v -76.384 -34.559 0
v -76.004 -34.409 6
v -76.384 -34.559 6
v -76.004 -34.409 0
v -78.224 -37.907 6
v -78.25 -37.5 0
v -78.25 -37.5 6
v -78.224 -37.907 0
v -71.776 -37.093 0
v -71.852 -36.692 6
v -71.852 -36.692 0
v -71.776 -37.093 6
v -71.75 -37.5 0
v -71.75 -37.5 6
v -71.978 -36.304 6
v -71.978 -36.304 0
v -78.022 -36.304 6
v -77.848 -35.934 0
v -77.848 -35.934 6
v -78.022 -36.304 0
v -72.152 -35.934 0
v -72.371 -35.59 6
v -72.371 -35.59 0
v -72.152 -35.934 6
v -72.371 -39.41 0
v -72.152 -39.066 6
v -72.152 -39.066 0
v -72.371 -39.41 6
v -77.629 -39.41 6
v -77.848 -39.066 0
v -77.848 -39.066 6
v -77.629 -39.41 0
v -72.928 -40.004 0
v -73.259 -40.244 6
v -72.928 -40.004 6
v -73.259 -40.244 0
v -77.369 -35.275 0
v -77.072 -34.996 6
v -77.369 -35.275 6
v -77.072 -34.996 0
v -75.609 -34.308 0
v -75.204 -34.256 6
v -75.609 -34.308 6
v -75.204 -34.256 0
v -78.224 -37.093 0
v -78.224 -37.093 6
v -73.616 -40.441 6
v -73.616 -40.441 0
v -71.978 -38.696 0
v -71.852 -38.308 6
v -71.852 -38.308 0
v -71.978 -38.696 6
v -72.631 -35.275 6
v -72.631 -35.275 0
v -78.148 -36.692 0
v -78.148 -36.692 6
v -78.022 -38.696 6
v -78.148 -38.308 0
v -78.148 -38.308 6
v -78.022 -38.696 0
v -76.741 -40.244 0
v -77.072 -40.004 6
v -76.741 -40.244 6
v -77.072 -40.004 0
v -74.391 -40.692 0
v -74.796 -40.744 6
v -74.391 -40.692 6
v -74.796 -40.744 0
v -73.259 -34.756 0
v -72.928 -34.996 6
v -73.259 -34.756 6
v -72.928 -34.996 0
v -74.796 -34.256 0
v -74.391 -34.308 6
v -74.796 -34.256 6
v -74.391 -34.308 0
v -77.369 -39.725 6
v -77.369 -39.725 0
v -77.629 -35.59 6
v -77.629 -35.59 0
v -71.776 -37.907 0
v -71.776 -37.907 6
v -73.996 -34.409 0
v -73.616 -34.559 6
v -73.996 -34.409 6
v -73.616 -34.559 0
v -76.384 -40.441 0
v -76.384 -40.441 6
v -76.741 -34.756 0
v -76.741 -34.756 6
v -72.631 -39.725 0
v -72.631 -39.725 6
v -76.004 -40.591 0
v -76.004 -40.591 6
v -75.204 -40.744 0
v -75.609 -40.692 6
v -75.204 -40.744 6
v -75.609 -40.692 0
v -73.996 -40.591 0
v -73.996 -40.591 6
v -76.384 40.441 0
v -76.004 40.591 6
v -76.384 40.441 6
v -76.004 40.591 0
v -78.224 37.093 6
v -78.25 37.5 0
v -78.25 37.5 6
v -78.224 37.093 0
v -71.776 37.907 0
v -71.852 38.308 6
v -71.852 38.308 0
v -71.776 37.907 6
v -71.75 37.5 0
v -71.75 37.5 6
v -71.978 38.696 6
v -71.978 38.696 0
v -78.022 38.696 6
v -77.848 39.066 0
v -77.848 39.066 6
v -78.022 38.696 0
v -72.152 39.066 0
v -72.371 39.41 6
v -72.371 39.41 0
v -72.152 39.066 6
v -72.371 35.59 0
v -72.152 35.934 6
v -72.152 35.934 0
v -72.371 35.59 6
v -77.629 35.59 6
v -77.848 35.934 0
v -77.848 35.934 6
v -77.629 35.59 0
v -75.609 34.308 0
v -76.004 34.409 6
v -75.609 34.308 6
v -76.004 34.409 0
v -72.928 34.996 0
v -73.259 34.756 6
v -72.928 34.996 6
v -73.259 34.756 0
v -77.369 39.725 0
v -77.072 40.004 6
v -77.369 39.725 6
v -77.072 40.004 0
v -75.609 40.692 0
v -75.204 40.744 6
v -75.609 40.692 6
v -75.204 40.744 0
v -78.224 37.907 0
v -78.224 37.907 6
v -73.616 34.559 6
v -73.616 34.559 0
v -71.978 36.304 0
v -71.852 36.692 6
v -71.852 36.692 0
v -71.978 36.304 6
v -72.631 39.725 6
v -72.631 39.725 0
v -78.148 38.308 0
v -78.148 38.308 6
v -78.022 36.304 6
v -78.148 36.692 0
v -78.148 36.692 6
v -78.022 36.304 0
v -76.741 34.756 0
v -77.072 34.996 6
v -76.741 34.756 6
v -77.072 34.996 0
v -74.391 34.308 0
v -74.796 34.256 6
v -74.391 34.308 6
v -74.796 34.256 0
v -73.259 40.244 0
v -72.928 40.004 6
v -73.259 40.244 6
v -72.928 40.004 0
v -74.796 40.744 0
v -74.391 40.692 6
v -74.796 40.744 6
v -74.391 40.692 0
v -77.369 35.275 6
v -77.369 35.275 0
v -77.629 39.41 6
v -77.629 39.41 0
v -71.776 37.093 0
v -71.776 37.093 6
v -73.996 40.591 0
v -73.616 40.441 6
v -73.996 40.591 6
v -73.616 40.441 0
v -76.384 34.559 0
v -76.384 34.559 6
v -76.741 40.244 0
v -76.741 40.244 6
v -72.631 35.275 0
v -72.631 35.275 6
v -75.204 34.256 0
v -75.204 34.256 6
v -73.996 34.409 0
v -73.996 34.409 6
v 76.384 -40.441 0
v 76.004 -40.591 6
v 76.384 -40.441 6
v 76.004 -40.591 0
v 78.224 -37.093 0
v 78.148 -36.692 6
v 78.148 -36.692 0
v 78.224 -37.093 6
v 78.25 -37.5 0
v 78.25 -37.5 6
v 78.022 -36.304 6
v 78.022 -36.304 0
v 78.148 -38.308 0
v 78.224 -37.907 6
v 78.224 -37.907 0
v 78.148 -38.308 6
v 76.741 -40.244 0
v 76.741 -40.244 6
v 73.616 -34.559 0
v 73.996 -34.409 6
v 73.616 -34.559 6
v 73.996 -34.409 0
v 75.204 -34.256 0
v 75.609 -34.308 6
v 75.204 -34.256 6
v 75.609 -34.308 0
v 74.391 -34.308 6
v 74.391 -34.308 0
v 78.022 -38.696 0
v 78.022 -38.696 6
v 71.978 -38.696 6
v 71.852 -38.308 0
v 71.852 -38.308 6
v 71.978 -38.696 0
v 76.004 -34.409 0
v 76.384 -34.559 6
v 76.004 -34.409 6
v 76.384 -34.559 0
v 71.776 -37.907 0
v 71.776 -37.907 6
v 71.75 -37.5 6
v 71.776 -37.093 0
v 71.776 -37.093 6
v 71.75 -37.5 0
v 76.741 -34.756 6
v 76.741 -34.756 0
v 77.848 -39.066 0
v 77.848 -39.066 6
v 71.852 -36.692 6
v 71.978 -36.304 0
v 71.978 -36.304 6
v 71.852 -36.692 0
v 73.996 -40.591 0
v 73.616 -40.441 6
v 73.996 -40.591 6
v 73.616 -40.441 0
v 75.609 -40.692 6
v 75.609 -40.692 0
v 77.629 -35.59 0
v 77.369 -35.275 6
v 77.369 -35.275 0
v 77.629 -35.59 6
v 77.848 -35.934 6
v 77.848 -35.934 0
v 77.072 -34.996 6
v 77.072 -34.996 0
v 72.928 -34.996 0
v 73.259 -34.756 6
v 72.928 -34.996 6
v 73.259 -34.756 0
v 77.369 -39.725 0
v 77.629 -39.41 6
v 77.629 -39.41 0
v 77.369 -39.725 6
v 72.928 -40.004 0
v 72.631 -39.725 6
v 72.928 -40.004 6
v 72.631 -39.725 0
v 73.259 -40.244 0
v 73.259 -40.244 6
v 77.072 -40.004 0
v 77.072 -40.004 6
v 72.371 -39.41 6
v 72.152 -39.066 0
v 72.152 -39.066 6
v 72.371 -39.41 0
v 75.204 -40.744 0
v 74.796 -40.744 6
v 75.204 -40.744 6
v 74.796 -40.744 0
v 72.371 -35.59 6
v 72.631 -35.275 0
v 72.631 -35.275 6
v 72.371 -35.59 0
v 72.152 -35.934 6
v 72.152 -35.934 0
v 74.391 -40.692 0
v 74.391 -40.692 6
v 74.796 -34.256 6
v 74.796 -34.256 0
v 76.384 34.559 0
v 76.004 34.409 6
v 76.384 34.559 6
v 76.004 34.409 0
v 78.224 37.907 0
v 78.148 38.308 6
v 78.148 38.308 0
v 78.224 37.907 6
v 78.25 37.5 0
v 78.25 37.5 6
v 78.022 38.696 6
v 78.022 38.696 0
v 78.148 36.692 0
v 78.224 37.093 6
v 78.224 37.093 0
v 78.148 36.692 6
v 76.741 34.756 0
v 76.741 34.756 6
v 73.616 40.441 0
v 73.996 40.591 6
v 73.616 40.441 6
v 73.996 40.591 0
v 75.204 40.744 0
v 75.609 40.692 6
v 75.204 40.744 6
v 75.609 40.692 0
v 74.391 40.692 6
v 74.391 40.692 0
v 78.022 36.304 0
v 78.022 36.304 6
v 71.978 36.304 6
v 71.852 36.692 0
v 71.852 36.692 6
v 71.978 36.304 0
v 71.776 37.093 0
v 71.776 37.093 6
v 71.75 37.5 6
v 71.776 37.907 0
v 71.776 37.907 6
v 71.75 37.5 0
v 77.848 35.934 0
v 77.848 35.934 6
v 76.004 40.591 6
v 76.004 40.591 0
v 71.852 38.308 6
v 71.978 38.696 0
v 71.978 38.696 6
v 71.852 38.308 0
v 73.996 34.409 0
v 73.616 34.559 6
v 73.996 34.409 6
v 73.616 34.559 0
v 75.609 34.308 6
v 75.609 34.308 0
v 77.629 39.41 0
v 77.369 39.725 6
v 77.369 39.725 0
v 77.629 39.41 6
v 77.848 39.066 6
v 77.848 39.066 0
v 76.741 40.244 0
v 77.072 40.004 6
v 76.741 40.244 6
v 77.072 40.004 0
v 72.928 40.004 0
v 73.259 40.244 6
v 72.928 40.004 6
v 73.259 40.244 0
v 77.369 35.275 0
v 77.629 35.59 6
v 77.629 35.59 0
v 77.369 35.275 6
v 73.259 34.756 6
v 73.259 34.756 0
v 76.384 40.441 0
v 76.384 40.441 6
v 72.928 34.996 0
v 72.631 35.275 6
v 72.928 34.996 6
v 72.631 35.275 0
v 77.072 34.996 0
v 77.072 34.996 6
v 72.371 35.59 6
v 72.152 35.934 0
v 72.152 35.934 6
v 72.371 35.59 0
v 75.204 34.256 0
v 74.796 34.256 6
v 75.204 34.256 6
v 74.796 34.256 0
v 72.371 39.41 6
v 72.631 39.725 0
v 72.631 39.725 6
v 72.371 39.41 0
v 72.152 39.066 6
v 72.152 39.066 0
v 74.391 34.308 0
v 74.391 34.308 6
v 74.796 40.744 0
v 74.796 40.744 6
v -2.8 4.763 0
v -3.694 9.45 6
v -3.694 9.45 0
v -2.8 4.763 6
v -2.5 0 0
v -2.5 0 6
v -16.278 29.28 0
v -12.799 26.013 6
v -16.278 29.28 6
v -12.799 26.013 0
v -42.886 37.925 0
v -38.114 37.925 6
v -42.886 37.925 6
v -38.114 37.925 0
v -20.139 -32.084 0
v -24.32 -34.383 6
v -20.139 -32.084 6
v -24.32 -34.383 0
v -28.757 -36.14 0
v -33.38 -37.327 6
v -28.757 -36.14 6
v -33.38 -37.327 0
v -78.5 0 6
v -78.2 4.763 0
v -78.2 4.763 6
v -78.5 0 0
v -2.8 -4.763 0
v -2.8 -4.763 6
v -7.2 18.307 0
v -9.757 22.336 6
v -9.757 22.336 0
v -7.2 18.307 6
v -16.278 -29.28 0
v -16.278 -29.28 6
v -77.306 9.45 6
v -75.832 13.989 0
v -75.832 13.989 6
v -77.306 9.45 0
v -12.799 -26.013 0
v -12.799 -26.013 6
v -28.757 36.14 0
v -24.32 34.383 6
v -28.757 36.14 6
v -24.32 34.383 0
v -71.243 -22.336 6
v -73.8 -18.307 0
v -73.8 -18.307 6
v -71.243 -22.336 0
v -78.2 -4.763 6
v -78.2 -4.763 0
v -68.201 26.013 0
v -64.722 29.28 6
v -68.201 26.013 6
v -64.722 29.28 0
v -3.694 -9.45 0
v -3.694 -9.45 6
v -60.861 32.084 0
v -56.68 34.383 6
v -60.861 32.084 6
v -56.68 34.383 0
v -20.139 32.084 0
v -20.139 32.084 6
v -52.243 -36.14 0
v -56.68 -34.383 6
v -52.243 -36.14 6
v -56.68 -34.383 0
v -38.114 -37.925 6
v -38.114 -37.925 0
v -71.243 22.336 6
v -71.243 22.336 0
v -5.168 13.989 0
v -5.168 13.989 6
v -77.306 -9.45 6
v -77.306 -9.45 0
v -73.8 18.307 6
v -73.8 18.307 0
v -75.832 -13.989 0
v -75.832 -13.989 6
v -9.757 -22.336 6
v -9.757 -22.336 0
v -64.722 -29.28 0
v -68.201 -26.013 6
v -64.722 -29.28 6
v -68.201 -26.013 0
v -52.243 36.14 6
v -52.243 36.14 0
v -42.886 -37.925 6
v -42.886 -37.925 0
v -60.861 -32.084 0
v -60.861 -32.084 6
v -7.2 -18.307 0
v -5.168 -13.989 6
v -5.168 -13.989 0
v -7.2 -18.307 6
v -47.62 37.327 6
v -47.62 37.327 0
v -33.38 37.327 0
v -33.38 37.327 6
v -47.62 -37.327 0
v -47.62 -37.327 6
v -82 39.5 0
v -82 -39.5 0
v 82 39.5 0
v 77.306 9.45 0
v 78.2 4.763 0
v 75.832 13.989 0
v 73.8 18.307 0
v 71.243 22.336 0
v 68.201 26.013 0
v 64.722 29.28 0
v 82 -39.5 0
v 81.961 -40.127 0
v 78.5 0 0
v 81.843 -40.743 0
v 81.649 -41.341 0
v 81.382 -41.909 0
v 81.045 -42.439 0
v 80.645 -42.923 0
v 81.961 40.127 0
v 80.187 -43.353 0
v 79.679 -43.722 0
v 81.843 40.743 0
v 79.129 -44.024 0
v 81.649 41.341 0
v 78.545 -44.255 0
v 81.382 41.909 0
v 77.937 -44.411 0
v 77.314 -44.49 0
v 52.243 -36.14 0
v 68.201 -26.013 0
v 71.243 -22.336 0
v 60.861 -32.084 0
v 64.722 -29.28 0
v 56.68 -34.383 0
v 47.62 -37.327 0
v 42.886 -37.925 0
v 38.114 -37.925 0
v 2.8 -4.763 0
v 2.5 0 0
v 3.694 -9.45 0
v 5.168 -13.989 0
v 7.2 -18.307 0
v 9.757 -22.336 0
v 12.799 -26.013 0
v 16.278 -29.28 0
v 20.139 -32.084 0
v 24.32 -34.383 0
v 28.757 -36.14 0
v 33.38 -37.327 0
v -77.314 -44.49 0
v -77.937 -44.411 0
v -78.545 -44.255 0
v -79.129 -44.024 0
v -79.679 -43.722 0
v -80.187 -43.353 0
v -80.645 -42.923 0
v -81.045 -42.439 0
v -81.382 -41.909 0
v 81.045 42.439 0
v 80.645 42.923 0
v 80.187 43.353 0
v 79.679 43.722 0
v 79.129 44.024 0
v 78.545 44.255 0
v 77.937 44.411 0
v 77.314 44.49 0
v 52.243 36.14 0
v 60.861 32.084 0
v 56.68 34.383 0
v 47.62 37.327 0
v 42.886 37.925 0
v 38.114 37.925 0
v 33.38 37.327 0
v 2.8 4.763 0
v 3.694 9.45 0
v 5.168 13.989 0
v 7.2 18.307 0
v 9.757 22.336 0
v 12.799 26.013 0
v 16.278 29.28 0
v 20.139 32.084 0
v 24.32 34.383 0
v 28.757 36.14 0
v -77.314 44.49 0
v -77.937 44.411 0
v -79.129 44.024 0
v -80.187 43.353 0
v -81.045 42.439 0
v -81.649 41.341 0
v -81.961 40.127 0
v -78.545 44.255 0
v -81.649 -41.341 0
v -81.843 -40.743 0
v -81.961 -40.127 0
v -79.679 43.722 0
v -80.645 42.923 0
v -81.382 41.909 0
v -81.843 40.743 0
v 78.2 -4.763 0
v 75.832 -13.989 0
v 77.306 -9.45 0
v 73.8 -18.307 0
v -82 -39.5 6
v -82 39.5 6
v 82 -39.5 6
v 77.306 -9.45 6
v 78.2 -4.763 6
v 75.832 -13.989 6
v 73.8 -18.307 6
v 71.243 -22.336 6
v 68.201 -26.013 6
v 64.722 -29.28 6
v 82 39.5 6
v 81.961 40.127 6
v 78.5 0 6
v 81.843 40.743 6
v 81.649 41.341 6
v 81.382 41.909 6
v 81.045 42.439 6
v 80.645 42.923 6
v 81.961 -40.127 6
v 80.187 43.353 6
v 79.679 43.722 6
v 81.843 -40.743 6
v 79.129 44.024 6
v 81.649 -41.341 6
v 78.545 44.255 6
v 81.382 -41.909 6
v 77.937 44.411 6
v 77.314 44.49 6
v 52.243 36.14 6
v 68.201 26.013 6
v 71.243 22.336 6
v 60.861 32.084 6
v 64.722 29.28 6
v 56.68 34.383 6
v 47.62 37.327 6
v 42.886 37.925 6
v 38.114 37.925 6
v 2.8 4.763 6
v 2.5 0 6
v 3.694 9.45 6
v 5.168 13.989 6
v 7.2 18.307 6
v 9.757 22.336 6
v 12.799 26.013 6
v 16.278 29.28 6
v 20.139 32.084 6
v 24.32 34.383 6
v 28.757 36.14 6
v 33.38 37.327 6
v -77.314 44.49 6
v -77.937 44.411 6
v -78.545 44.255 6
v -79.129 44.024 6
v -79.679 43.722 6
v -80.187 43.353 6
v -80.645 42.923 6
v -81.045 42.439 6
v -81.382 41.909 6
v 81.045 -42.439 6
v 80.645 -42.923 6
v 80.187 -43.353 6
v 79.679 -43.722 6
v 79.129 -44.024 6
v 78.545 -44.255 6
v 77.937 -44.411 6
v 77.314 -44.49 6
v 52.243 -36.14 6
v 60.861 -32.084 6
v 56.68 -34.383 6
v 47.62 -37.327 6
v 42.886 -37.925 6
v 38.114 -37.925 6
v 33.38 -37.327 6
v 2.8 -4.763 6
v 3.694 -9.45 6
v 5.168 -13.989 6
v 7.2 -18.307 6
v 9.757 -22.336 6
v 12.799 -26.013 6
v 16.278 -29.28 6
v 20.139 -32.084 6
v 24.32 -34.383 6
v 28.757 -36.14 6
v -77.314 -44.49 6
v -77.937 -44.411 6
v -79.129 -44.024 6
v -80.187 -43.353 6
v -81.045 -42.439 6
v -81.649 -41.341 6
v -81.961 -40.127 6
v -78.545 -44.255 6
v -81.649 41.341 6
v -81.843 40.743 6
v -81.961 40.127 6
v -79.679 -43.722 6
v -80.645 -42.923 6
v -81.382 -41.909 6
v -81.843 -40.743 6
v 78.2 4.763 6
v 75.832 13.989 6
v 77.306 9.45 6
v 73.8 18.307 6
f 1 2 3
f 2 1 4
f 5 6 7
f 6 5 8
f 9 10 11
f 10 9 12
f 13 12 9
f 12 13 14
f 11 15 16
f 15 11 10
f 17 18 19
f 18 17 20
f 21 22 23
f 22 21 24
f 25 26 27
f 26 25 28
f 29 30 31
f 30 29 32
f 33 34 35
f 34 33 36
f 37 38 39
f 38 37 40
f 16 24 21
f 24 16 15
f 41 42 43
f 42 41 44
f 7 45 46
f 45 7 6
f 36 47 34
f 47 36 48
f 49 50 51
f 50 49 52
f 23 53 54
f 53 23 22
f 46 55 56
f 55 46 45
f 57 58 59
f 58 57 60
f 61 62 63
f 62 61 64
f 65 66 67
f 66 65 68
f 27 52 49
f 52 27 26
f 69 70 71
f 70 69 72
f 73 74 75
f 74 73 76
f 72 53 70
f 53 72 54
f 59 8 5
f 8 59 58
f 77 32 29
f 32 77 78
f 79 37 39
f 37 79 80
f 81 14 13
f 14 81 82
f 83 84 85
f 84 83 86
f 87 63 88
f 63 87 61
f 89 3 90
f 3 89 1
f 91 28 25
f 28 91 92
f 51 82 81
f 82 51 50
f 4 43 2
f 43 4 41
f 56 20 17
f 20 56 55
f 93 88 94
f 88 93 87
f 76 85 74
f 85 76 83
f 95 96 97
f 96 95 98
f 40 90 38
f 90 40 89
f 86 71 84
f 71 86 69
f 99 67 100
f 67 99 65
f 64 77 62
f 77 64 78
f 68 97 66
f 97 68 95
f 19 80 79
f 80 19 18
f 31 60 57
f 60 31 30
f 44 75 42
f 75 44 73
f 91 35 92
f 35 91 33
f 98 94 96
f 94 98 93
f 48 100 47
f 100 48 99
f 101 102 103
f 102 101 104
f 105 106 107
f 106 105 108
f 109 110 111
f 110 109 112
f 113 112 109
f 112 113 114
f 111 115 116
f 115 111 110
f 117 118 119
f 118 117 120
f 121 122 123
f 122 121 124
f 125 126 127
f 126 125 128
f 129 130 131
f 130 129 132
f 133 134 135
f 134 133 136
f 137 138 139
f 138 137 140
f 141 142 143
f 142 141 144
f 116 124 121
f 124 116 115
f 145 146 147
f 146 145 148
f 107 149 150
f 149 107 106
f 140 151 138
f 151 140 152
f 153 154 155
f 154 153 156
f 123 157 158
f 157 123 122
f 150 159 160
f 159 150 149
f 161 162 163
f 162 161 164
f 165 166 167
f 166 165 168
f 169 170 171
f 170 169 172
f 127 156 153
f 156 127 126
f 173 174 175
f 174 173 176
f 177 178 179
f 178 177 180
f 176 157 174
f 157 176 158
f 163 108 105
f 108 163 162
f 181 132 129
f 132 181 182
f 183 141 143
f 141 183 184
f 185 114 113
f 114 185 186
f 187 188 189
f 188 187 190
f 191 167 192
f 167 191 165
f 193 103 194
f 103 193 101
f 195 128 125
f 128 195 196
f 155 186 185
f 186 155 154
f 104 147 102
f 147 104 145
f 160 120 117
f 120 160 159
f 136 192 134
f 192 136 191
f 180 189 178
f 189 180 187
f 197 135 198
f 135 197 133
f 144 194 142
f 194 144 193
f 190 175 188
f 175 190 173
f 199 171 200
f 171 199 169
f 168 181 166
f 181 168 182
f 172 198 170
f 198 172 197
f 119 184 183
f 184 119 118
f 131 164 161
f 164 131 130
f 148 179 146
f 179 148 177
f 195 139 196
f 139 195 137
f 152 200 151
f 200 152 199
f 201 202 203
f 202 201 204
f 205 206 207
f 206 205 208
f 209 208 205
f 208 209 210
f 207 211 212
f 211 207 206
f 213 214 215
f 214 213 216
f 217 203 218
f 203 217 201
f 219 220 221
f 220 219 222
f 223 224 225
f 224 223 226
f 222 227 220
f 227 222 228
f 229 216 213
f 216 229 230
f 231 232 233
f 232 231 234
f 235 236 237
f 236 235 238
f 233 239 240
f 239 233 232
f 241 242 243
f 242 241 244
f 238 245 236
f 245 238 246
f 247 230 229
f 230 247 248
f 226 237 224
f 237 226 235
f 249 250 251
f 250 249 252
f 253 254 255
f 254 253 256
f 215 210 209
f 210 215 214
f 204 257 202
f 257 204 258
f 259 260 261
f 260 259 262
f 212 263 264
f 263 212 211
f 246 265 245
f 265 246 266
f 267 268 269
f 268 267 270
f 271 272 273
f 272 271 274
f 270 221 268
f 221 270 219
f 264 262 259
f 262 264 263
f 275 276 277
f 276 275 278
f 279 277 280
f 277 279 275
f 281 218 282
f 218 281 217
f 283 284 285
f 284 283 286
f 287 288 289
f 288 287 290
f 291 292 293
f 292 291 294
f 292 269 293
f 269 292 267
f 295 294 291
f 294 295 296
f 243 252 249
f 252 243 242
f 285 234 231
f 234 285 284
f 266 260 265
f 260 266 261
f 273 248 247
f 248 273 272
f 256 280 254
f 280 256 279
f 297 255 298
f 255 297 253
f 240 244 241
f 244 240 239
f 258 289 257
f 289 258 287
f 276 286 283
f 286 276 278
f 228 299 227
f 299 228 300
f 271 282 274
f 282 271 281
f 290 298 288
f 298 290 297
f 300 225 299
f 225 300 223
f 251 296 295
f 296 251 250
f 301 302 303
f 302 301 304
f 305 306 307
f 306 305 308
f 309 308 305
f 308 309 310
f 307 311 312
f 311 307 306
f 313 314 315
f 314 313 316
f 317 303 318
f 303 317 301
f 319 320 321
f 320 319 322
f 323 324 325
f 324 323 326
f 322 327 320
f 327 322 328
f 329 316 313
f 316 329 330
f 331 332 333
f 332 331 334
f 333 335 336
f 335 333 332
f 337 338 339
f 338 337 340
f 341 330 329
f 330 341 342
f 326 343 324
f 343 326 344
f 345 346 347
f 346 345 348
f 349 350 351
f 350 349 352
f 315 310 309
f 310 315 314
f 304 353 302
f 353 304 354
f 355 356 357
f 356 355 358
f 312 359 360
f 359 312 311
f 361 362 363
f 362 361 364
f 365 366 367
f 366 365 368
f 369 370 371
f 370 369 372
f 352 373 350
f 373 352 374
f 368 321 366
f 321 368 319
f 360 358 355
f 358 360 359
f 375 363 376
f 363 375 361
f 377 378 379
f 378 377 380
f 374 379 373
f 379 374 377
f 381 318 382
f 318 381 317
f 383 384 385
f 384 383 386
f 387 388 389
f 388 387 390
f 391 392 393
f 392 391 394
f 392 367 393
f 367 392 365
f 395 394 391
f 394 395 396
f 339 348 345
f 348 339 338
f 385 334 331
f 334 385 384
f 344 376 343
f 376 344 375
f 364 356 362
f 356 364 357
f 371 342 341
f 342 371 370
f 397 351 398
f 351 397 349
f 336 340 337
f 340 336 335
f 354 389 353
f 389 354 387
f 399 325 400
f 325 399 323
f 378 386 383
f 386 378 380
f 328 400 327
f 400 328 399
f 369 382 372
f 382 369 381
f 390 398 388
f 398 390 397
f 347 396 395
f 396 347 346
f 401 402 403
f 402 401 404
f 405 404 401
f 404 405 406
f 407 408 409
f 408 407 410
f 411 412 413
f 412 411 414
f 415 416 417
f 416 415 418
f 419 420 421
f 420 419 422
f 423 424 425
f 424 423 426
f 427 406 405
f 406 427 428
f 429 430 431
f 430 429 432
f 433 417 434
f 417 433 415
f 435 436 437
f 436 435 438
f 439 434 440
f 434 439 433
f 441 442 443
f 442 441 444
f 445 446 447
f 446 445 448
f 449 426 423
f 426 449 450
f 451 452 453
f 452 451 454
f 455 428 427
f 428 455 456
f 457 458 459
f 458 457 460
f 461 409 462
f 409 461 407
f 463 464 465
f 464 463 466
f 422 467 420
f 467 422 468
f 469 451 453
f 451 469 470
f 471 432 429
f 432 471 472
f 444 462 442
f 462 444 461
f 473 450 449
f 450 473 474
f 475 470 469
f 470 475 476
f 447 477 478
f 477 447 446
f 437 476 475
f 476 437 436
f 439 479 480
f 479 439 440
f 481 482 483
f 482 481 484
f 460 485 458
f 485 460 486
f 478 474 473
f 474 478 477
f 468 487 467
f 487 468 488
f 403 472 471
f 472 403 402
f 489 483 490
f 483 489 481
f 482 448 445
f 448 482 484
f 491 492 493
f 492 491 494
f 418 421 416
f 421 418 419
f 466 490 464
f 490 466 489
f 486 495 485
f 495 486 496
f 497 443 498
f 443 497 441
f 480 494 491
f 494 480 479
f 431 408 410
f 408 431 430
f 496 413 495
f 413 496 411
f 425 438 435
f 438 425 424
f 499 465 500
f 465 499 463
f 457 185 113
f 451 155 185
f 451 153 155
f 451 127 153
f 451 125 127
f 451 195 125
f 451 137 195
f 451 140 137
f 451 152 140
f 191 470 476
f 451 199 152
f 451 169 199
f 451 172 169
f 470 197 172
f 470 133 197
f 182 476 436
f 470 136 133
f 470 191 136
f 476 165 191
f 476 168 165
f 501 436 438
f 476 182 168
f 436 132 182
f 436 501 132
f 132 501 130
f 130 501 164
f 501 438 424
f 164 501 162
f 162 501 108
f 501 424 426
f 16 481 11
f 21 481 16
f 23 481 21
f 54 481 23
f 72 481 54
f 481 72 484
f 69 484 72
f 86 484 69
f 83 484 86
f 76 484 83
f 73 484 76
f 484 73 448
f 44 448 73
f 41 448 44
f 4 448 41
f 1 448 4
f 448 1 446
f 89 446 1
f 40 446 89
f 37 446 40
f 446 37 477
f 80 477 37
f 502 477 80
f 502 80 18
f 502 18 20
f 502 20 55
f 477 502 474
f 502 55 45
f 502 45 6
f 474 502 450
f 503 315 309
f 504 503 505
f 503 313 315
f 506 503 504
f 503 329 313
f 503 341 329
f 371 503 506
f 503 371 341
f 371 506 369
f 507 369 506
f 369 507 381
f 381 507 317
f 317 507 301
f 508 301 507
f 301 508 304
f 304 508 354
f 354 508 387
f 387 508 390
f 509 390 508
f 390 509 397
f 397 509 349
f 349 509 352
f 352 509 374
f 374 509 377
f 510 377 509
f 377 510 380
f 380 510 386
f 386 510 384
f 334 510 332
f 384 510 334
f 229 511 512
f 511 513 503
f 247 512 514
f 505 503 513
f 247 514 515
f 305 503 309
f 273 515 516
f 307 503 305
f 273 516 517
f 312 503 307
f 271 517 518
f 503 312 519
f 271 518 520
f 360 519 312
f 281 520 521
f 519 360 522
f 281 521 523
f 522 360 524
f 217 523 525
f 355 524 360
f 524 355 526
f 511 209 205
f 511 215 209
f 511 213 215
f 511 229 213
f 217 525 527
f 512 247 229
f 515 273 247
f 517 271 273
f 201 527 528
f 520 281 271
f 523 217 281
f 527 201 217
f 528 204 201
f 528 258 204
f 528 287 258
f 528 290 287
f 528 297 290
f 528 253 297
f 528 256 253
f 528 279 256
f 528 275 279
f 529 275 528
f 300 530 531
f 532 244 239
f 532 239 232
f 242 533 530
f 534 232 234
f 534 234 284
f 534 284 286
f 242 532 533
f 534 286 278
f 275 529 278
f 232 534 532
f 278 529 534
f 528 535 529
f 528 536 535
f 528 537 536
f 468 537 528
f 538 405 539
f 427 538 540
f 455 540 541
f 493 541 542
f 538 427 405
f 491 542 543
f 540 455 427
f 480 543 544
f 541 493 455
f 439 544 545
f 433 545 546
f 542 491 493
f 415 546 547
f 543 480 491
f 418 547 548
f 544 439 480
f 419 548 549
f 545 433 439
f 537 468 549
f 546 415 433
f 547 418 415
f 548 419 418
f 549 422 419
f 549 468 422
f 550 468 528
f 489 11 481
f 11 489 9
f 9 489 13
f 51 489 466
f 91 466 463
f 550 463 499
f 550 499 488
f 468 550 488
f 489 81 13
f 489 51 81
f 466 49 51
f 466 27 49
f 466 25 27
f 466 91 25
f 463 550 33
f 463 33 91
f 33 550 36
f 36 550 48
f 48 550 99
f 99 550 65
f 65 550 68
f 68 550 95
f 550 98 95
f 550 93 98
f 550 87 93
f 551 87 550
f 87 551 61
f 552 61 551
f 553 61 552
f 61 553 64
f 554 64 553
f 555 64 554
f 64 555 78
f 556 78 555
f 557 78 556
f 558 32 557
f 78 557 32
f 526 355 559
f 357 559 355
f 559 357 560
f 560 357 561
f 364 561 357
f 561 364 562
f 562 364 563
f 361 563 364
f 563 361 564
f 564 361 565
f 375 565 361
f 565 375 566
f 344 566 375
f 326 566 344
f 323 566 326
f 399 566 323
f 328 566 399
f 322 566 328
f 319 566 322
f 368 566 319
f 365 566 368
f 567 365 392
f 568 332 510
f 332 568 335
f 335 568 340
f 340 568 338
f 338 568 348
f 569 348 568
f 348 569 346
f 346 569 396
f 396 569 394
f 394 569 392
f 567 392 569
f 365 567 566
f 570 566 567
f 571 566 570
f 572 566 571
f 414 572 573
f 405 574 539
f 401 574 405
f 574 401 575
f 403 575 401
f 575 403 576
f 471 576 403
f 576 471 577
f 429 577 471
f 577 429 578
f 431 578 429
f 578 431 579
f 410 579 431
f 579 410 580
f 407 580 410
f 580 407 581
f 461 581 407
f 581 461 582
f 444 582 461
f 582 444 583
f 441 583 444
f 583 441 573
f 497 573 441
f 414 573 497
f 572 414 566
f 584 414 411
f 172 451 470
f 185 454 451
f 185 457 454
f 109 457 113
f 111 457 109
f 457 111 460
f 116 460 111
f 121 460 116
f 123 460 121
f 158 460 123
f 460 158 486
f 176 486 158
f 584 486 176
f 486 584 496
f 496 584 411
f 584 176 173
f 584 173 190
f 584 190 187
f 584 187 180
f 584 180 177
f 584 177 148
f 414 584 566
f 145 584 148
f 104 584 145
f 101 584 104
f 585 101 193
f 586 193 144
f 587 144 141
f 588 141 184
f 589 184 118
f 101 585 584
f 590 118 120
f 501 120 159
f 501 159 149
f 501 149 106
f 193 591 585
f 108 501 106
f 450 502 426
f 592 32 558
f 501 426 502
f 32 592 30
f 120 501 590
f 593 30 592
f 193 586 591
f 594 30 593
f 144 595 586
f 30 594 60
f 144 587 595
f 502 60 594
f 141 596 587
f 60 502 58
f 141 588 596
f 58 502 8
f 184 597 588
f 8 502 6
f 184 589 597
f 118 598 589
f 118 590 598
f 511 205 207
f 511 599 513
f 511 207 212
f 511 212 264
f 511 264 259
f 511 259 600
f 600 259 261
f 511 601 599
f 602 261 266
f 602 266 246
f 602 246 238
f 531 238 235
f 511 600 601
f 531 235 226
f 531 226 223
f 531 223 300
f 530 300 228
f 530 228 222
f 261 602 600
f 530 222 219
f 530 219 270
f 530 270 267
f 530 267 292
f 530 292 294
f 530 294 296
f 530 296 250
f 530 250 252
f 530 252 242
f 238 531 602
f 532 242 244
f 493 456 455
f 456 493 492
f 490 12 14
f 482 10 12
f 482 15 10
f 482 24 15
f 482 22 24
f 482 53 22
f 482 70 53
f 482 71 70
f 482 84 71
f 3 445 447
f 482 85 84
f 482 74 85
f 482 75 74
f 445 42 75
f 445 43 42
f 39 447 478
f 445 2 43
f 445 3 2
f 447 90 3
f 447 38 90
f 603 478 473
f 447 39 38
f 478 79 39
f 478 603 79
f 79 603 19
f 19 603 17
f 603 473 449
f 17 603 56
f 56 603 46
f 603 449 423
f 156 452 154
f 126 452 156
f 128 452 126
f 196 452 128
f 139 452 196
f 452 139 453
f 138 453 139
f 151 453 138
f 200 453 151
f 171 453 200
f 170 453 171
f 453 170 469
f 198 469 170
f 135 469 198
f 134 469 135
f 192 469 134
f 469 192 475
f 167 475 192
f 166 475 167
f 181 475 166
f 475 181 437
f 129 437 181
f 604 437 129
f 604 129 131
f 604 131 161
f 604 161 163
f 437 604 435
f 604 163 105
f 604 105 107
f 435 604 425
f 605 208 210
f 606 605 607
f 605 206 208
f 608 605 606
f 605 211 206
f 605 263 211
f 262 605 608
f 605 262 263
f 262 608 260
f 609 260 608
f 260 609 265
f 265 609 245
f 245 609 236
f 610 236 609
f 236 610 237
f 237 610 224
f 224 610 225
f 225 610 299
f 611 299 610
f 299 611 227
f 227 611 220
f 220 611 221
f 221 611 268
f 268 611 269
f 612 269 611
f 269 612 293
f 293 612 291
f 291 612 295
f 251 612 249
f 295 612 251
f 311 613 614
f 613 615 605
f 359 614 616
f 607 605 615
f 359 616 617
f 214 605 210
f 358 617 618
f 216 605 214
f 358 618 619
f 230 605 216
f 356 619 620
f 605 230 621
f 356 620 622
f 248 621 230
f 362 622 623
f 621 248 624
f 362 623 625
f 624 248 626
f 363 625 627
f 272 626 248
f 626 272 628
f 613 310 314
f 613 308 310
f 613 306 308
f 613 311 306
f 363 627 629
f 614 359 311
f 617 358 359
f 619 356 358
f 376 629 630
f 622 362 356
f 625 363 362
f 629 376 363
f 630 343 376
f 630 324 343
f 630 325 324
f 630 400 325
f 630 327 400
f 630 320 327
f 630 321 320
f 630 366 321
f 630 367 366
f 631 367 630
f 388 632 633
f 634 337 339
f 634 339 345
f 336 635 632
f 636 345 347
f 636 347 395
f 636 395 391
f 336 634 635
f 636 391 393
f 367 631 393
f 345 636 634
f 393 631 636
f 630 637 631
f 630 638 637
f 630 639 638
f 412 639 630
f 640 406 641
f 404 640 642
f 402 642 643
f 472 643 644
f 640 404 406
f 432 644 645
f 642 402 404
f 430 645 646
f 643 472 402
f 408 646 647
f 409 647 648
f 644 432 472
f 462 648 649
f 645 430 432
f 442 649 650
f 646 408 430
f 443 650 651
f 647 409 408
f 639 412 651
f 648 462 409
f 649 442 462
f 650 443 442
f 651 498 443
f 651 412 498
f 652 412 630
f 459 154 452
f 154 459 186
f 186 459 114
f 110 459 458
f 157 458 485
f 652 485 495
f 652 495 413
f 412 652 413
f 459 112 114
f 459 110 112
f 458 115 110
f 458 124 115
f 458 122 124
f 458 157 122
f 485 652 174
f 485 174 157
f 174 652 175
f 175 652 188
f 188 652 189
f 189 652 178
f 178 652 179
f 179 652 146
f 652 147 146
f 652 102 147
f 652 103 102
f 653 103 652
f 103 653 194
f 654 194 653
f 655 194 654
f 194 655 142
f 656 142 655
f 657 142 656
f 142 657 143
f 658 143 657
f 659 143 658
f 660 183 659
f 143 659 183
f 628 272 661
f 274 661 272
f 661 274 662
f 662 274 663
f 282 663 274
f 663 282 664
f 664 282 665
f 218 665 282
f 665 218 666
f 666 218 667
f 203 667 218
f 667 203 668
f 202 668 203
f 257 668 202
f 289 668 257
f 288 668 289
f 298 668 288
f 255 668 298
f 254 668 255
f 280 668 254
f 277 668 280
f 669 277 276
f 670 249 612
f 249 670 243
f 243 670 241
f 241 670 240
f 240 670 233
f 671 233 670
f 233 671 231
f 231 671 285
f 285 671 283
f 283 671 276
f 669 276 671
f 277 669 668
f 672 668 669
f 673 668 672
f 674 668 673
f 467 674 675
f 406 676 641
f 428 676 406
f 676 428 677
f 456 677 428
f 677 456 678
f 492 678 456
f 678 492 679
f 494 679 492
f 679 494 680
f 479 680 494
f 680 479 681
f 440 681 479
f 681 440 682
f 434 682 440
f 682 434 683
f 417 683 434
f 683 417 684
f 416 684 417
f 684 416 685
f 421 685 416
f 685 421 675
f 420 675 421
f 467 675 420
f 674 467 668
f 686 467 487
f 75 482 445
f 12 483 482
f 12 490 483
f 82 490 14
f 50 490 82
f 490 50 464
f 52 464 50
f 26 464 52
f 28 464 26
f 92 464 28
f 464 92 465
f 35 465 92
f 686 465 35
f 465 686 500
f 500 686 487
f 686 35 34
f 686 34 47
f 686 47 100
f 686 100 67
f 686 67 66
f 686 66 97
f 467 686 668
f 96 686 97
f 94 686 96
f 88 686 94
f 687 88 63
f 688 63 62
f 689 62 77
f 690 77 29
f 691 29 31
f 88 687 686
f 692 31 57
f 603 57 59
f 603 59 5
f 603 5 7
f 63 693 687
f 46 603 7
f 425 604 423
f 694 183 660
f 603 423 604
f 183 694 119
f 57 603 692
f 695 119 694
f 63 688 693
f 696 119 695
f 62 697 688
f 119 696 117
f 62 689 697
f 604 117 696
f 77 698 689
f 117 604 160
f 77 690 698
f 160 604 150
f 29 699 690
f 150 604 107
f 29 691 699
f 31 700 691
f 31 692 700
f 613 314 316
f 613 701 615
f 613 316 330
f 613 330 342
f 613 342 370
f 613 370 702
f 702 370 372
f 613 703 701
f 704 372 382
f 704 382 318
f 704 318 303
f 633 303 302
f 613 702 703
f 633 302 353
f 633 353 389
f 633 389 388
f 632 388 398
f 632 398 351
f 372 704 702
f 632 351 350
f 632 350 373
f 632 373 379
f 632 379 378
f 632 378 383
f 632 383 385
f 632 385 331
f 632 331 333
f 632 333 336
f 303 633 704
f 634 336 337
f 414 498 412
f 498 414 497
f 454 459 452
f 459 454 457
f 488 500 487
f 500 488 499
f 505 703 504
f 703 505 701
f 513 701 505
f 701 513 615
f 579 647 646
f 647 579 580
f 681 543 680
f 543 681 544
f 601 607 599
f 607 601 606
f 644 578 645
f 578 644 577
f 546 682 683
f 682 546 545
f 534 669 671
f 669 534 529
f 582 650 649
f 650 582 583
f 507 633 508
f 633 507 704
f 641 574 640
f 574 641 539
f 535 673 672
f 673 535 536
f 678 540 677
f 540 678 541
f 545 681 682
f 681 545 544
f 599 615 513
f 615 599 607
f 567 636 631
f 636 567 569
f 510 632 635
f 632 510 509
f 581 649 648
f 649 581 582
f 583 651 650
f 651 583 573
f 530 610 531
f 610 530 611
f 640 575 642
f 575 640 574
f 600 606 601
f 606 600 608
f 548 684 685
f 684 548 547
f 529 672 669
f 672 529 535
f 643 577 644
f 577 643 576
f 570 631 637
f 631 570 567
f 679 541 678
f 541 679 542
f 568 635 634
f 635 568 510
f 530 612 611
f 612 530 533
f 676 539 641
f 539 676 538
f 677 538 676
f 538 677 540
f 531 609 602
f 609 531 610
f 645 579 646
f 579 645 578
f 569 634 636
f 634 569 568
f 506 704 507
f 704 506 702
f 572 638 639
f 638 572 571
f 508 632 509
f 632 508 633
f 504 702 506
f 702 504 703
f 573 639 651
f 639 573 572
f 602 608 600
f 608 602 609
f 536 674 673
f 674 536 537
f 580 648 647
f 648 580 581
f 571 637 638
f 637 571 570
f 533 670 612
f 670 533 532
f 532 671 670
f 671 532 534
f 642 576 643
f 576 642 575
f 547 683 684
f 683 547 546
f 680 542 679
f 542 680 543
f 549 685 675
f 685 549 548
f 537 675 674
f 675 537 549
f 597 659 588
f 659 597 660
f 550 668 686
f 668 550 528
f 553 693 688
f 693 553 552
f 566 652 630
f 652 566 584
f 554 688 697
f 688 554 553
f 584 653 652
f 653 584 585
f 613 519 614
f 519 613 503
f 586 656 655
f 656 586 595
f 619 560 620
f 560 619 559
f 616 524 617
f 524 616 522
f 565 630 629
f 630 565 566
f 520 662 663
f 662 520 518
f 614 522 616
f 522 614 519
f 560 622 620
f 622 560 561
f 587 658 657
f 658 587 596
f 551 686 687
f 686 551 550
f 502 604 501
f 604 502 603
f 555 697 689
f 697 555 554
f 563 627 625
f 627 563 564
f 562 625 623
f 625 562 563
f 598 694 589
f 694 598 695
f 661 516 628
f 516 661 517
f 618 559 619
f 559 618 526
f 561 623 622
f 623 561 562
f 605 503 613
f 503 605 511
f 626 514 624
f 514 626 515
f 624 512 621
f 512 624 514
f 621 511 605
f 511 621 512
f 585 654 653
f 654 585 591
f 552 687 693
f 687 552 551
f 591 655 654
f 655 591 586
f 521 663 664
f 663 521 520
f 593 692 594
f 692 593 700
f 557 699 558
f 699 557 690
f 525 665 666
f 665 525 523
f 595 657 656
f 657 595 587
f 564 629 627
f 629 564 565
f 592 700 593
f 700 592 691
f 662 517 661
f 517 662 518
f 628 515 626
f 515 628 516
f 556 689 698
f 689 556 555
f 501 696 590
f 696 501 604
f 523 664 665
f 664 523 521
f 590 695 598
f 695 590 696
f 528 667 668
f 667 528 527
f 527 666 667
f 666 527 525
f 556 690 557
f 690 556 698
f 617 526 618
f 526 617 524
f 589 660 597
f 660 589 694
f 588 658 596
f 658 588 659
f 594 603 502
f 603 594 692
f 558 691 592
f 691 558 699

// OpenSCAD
$fn = 50;


difference() {
	union() {
		hull() {
			translate(v = [-77.0000000000, 39.5000000000, 0]) {
				cylinder(h = 6, r = 5);
			}
			translate(v = [77.0000000000, 39.5000000000, 0]) {
				cylinder(h = 6, r = 5);
			}
			translate(v = [-77.0000000000, -39.5000000000, 0]) {
				cylinder(h = 6, r = 5);
			}
			translate(v = [77.0000000000, -39.5000000000, 0]) {
				cylinder(h = 6, r = 5);
			}
		}
	}
	union() {
		#translate(v = [-75.0000000000, -37.5000000000, -100.0000000000]) {
			cylinder(h = 200, r = 3.2500000000);
		}
		#translate(v = [-75.0000000000, 37.5000000000, -100.0000000000]) {
			cylinder(h = 200, r = 3.2500000000);
		}
		#translate(v = [75.0000000000, -37.5000000000, -100.0000000000]) {
			cylinder(h = 200, r = 3.2500000000);
		}
		#translate(v = [75.0000000000, 37.5000000000, -100.0000000000]) {
			cylinder(h = 200, r = 3.2500000000);
		}
		#translate(v = [-40.5000000000, 0, 0]) {
			cylinder(h = 6, r = 38.0000000000);
		}
		#translate(v = [40.5000000000, 0, 0]) {
			cylinder(h = 6, r = 38.0000000000);
		}
	}
}
